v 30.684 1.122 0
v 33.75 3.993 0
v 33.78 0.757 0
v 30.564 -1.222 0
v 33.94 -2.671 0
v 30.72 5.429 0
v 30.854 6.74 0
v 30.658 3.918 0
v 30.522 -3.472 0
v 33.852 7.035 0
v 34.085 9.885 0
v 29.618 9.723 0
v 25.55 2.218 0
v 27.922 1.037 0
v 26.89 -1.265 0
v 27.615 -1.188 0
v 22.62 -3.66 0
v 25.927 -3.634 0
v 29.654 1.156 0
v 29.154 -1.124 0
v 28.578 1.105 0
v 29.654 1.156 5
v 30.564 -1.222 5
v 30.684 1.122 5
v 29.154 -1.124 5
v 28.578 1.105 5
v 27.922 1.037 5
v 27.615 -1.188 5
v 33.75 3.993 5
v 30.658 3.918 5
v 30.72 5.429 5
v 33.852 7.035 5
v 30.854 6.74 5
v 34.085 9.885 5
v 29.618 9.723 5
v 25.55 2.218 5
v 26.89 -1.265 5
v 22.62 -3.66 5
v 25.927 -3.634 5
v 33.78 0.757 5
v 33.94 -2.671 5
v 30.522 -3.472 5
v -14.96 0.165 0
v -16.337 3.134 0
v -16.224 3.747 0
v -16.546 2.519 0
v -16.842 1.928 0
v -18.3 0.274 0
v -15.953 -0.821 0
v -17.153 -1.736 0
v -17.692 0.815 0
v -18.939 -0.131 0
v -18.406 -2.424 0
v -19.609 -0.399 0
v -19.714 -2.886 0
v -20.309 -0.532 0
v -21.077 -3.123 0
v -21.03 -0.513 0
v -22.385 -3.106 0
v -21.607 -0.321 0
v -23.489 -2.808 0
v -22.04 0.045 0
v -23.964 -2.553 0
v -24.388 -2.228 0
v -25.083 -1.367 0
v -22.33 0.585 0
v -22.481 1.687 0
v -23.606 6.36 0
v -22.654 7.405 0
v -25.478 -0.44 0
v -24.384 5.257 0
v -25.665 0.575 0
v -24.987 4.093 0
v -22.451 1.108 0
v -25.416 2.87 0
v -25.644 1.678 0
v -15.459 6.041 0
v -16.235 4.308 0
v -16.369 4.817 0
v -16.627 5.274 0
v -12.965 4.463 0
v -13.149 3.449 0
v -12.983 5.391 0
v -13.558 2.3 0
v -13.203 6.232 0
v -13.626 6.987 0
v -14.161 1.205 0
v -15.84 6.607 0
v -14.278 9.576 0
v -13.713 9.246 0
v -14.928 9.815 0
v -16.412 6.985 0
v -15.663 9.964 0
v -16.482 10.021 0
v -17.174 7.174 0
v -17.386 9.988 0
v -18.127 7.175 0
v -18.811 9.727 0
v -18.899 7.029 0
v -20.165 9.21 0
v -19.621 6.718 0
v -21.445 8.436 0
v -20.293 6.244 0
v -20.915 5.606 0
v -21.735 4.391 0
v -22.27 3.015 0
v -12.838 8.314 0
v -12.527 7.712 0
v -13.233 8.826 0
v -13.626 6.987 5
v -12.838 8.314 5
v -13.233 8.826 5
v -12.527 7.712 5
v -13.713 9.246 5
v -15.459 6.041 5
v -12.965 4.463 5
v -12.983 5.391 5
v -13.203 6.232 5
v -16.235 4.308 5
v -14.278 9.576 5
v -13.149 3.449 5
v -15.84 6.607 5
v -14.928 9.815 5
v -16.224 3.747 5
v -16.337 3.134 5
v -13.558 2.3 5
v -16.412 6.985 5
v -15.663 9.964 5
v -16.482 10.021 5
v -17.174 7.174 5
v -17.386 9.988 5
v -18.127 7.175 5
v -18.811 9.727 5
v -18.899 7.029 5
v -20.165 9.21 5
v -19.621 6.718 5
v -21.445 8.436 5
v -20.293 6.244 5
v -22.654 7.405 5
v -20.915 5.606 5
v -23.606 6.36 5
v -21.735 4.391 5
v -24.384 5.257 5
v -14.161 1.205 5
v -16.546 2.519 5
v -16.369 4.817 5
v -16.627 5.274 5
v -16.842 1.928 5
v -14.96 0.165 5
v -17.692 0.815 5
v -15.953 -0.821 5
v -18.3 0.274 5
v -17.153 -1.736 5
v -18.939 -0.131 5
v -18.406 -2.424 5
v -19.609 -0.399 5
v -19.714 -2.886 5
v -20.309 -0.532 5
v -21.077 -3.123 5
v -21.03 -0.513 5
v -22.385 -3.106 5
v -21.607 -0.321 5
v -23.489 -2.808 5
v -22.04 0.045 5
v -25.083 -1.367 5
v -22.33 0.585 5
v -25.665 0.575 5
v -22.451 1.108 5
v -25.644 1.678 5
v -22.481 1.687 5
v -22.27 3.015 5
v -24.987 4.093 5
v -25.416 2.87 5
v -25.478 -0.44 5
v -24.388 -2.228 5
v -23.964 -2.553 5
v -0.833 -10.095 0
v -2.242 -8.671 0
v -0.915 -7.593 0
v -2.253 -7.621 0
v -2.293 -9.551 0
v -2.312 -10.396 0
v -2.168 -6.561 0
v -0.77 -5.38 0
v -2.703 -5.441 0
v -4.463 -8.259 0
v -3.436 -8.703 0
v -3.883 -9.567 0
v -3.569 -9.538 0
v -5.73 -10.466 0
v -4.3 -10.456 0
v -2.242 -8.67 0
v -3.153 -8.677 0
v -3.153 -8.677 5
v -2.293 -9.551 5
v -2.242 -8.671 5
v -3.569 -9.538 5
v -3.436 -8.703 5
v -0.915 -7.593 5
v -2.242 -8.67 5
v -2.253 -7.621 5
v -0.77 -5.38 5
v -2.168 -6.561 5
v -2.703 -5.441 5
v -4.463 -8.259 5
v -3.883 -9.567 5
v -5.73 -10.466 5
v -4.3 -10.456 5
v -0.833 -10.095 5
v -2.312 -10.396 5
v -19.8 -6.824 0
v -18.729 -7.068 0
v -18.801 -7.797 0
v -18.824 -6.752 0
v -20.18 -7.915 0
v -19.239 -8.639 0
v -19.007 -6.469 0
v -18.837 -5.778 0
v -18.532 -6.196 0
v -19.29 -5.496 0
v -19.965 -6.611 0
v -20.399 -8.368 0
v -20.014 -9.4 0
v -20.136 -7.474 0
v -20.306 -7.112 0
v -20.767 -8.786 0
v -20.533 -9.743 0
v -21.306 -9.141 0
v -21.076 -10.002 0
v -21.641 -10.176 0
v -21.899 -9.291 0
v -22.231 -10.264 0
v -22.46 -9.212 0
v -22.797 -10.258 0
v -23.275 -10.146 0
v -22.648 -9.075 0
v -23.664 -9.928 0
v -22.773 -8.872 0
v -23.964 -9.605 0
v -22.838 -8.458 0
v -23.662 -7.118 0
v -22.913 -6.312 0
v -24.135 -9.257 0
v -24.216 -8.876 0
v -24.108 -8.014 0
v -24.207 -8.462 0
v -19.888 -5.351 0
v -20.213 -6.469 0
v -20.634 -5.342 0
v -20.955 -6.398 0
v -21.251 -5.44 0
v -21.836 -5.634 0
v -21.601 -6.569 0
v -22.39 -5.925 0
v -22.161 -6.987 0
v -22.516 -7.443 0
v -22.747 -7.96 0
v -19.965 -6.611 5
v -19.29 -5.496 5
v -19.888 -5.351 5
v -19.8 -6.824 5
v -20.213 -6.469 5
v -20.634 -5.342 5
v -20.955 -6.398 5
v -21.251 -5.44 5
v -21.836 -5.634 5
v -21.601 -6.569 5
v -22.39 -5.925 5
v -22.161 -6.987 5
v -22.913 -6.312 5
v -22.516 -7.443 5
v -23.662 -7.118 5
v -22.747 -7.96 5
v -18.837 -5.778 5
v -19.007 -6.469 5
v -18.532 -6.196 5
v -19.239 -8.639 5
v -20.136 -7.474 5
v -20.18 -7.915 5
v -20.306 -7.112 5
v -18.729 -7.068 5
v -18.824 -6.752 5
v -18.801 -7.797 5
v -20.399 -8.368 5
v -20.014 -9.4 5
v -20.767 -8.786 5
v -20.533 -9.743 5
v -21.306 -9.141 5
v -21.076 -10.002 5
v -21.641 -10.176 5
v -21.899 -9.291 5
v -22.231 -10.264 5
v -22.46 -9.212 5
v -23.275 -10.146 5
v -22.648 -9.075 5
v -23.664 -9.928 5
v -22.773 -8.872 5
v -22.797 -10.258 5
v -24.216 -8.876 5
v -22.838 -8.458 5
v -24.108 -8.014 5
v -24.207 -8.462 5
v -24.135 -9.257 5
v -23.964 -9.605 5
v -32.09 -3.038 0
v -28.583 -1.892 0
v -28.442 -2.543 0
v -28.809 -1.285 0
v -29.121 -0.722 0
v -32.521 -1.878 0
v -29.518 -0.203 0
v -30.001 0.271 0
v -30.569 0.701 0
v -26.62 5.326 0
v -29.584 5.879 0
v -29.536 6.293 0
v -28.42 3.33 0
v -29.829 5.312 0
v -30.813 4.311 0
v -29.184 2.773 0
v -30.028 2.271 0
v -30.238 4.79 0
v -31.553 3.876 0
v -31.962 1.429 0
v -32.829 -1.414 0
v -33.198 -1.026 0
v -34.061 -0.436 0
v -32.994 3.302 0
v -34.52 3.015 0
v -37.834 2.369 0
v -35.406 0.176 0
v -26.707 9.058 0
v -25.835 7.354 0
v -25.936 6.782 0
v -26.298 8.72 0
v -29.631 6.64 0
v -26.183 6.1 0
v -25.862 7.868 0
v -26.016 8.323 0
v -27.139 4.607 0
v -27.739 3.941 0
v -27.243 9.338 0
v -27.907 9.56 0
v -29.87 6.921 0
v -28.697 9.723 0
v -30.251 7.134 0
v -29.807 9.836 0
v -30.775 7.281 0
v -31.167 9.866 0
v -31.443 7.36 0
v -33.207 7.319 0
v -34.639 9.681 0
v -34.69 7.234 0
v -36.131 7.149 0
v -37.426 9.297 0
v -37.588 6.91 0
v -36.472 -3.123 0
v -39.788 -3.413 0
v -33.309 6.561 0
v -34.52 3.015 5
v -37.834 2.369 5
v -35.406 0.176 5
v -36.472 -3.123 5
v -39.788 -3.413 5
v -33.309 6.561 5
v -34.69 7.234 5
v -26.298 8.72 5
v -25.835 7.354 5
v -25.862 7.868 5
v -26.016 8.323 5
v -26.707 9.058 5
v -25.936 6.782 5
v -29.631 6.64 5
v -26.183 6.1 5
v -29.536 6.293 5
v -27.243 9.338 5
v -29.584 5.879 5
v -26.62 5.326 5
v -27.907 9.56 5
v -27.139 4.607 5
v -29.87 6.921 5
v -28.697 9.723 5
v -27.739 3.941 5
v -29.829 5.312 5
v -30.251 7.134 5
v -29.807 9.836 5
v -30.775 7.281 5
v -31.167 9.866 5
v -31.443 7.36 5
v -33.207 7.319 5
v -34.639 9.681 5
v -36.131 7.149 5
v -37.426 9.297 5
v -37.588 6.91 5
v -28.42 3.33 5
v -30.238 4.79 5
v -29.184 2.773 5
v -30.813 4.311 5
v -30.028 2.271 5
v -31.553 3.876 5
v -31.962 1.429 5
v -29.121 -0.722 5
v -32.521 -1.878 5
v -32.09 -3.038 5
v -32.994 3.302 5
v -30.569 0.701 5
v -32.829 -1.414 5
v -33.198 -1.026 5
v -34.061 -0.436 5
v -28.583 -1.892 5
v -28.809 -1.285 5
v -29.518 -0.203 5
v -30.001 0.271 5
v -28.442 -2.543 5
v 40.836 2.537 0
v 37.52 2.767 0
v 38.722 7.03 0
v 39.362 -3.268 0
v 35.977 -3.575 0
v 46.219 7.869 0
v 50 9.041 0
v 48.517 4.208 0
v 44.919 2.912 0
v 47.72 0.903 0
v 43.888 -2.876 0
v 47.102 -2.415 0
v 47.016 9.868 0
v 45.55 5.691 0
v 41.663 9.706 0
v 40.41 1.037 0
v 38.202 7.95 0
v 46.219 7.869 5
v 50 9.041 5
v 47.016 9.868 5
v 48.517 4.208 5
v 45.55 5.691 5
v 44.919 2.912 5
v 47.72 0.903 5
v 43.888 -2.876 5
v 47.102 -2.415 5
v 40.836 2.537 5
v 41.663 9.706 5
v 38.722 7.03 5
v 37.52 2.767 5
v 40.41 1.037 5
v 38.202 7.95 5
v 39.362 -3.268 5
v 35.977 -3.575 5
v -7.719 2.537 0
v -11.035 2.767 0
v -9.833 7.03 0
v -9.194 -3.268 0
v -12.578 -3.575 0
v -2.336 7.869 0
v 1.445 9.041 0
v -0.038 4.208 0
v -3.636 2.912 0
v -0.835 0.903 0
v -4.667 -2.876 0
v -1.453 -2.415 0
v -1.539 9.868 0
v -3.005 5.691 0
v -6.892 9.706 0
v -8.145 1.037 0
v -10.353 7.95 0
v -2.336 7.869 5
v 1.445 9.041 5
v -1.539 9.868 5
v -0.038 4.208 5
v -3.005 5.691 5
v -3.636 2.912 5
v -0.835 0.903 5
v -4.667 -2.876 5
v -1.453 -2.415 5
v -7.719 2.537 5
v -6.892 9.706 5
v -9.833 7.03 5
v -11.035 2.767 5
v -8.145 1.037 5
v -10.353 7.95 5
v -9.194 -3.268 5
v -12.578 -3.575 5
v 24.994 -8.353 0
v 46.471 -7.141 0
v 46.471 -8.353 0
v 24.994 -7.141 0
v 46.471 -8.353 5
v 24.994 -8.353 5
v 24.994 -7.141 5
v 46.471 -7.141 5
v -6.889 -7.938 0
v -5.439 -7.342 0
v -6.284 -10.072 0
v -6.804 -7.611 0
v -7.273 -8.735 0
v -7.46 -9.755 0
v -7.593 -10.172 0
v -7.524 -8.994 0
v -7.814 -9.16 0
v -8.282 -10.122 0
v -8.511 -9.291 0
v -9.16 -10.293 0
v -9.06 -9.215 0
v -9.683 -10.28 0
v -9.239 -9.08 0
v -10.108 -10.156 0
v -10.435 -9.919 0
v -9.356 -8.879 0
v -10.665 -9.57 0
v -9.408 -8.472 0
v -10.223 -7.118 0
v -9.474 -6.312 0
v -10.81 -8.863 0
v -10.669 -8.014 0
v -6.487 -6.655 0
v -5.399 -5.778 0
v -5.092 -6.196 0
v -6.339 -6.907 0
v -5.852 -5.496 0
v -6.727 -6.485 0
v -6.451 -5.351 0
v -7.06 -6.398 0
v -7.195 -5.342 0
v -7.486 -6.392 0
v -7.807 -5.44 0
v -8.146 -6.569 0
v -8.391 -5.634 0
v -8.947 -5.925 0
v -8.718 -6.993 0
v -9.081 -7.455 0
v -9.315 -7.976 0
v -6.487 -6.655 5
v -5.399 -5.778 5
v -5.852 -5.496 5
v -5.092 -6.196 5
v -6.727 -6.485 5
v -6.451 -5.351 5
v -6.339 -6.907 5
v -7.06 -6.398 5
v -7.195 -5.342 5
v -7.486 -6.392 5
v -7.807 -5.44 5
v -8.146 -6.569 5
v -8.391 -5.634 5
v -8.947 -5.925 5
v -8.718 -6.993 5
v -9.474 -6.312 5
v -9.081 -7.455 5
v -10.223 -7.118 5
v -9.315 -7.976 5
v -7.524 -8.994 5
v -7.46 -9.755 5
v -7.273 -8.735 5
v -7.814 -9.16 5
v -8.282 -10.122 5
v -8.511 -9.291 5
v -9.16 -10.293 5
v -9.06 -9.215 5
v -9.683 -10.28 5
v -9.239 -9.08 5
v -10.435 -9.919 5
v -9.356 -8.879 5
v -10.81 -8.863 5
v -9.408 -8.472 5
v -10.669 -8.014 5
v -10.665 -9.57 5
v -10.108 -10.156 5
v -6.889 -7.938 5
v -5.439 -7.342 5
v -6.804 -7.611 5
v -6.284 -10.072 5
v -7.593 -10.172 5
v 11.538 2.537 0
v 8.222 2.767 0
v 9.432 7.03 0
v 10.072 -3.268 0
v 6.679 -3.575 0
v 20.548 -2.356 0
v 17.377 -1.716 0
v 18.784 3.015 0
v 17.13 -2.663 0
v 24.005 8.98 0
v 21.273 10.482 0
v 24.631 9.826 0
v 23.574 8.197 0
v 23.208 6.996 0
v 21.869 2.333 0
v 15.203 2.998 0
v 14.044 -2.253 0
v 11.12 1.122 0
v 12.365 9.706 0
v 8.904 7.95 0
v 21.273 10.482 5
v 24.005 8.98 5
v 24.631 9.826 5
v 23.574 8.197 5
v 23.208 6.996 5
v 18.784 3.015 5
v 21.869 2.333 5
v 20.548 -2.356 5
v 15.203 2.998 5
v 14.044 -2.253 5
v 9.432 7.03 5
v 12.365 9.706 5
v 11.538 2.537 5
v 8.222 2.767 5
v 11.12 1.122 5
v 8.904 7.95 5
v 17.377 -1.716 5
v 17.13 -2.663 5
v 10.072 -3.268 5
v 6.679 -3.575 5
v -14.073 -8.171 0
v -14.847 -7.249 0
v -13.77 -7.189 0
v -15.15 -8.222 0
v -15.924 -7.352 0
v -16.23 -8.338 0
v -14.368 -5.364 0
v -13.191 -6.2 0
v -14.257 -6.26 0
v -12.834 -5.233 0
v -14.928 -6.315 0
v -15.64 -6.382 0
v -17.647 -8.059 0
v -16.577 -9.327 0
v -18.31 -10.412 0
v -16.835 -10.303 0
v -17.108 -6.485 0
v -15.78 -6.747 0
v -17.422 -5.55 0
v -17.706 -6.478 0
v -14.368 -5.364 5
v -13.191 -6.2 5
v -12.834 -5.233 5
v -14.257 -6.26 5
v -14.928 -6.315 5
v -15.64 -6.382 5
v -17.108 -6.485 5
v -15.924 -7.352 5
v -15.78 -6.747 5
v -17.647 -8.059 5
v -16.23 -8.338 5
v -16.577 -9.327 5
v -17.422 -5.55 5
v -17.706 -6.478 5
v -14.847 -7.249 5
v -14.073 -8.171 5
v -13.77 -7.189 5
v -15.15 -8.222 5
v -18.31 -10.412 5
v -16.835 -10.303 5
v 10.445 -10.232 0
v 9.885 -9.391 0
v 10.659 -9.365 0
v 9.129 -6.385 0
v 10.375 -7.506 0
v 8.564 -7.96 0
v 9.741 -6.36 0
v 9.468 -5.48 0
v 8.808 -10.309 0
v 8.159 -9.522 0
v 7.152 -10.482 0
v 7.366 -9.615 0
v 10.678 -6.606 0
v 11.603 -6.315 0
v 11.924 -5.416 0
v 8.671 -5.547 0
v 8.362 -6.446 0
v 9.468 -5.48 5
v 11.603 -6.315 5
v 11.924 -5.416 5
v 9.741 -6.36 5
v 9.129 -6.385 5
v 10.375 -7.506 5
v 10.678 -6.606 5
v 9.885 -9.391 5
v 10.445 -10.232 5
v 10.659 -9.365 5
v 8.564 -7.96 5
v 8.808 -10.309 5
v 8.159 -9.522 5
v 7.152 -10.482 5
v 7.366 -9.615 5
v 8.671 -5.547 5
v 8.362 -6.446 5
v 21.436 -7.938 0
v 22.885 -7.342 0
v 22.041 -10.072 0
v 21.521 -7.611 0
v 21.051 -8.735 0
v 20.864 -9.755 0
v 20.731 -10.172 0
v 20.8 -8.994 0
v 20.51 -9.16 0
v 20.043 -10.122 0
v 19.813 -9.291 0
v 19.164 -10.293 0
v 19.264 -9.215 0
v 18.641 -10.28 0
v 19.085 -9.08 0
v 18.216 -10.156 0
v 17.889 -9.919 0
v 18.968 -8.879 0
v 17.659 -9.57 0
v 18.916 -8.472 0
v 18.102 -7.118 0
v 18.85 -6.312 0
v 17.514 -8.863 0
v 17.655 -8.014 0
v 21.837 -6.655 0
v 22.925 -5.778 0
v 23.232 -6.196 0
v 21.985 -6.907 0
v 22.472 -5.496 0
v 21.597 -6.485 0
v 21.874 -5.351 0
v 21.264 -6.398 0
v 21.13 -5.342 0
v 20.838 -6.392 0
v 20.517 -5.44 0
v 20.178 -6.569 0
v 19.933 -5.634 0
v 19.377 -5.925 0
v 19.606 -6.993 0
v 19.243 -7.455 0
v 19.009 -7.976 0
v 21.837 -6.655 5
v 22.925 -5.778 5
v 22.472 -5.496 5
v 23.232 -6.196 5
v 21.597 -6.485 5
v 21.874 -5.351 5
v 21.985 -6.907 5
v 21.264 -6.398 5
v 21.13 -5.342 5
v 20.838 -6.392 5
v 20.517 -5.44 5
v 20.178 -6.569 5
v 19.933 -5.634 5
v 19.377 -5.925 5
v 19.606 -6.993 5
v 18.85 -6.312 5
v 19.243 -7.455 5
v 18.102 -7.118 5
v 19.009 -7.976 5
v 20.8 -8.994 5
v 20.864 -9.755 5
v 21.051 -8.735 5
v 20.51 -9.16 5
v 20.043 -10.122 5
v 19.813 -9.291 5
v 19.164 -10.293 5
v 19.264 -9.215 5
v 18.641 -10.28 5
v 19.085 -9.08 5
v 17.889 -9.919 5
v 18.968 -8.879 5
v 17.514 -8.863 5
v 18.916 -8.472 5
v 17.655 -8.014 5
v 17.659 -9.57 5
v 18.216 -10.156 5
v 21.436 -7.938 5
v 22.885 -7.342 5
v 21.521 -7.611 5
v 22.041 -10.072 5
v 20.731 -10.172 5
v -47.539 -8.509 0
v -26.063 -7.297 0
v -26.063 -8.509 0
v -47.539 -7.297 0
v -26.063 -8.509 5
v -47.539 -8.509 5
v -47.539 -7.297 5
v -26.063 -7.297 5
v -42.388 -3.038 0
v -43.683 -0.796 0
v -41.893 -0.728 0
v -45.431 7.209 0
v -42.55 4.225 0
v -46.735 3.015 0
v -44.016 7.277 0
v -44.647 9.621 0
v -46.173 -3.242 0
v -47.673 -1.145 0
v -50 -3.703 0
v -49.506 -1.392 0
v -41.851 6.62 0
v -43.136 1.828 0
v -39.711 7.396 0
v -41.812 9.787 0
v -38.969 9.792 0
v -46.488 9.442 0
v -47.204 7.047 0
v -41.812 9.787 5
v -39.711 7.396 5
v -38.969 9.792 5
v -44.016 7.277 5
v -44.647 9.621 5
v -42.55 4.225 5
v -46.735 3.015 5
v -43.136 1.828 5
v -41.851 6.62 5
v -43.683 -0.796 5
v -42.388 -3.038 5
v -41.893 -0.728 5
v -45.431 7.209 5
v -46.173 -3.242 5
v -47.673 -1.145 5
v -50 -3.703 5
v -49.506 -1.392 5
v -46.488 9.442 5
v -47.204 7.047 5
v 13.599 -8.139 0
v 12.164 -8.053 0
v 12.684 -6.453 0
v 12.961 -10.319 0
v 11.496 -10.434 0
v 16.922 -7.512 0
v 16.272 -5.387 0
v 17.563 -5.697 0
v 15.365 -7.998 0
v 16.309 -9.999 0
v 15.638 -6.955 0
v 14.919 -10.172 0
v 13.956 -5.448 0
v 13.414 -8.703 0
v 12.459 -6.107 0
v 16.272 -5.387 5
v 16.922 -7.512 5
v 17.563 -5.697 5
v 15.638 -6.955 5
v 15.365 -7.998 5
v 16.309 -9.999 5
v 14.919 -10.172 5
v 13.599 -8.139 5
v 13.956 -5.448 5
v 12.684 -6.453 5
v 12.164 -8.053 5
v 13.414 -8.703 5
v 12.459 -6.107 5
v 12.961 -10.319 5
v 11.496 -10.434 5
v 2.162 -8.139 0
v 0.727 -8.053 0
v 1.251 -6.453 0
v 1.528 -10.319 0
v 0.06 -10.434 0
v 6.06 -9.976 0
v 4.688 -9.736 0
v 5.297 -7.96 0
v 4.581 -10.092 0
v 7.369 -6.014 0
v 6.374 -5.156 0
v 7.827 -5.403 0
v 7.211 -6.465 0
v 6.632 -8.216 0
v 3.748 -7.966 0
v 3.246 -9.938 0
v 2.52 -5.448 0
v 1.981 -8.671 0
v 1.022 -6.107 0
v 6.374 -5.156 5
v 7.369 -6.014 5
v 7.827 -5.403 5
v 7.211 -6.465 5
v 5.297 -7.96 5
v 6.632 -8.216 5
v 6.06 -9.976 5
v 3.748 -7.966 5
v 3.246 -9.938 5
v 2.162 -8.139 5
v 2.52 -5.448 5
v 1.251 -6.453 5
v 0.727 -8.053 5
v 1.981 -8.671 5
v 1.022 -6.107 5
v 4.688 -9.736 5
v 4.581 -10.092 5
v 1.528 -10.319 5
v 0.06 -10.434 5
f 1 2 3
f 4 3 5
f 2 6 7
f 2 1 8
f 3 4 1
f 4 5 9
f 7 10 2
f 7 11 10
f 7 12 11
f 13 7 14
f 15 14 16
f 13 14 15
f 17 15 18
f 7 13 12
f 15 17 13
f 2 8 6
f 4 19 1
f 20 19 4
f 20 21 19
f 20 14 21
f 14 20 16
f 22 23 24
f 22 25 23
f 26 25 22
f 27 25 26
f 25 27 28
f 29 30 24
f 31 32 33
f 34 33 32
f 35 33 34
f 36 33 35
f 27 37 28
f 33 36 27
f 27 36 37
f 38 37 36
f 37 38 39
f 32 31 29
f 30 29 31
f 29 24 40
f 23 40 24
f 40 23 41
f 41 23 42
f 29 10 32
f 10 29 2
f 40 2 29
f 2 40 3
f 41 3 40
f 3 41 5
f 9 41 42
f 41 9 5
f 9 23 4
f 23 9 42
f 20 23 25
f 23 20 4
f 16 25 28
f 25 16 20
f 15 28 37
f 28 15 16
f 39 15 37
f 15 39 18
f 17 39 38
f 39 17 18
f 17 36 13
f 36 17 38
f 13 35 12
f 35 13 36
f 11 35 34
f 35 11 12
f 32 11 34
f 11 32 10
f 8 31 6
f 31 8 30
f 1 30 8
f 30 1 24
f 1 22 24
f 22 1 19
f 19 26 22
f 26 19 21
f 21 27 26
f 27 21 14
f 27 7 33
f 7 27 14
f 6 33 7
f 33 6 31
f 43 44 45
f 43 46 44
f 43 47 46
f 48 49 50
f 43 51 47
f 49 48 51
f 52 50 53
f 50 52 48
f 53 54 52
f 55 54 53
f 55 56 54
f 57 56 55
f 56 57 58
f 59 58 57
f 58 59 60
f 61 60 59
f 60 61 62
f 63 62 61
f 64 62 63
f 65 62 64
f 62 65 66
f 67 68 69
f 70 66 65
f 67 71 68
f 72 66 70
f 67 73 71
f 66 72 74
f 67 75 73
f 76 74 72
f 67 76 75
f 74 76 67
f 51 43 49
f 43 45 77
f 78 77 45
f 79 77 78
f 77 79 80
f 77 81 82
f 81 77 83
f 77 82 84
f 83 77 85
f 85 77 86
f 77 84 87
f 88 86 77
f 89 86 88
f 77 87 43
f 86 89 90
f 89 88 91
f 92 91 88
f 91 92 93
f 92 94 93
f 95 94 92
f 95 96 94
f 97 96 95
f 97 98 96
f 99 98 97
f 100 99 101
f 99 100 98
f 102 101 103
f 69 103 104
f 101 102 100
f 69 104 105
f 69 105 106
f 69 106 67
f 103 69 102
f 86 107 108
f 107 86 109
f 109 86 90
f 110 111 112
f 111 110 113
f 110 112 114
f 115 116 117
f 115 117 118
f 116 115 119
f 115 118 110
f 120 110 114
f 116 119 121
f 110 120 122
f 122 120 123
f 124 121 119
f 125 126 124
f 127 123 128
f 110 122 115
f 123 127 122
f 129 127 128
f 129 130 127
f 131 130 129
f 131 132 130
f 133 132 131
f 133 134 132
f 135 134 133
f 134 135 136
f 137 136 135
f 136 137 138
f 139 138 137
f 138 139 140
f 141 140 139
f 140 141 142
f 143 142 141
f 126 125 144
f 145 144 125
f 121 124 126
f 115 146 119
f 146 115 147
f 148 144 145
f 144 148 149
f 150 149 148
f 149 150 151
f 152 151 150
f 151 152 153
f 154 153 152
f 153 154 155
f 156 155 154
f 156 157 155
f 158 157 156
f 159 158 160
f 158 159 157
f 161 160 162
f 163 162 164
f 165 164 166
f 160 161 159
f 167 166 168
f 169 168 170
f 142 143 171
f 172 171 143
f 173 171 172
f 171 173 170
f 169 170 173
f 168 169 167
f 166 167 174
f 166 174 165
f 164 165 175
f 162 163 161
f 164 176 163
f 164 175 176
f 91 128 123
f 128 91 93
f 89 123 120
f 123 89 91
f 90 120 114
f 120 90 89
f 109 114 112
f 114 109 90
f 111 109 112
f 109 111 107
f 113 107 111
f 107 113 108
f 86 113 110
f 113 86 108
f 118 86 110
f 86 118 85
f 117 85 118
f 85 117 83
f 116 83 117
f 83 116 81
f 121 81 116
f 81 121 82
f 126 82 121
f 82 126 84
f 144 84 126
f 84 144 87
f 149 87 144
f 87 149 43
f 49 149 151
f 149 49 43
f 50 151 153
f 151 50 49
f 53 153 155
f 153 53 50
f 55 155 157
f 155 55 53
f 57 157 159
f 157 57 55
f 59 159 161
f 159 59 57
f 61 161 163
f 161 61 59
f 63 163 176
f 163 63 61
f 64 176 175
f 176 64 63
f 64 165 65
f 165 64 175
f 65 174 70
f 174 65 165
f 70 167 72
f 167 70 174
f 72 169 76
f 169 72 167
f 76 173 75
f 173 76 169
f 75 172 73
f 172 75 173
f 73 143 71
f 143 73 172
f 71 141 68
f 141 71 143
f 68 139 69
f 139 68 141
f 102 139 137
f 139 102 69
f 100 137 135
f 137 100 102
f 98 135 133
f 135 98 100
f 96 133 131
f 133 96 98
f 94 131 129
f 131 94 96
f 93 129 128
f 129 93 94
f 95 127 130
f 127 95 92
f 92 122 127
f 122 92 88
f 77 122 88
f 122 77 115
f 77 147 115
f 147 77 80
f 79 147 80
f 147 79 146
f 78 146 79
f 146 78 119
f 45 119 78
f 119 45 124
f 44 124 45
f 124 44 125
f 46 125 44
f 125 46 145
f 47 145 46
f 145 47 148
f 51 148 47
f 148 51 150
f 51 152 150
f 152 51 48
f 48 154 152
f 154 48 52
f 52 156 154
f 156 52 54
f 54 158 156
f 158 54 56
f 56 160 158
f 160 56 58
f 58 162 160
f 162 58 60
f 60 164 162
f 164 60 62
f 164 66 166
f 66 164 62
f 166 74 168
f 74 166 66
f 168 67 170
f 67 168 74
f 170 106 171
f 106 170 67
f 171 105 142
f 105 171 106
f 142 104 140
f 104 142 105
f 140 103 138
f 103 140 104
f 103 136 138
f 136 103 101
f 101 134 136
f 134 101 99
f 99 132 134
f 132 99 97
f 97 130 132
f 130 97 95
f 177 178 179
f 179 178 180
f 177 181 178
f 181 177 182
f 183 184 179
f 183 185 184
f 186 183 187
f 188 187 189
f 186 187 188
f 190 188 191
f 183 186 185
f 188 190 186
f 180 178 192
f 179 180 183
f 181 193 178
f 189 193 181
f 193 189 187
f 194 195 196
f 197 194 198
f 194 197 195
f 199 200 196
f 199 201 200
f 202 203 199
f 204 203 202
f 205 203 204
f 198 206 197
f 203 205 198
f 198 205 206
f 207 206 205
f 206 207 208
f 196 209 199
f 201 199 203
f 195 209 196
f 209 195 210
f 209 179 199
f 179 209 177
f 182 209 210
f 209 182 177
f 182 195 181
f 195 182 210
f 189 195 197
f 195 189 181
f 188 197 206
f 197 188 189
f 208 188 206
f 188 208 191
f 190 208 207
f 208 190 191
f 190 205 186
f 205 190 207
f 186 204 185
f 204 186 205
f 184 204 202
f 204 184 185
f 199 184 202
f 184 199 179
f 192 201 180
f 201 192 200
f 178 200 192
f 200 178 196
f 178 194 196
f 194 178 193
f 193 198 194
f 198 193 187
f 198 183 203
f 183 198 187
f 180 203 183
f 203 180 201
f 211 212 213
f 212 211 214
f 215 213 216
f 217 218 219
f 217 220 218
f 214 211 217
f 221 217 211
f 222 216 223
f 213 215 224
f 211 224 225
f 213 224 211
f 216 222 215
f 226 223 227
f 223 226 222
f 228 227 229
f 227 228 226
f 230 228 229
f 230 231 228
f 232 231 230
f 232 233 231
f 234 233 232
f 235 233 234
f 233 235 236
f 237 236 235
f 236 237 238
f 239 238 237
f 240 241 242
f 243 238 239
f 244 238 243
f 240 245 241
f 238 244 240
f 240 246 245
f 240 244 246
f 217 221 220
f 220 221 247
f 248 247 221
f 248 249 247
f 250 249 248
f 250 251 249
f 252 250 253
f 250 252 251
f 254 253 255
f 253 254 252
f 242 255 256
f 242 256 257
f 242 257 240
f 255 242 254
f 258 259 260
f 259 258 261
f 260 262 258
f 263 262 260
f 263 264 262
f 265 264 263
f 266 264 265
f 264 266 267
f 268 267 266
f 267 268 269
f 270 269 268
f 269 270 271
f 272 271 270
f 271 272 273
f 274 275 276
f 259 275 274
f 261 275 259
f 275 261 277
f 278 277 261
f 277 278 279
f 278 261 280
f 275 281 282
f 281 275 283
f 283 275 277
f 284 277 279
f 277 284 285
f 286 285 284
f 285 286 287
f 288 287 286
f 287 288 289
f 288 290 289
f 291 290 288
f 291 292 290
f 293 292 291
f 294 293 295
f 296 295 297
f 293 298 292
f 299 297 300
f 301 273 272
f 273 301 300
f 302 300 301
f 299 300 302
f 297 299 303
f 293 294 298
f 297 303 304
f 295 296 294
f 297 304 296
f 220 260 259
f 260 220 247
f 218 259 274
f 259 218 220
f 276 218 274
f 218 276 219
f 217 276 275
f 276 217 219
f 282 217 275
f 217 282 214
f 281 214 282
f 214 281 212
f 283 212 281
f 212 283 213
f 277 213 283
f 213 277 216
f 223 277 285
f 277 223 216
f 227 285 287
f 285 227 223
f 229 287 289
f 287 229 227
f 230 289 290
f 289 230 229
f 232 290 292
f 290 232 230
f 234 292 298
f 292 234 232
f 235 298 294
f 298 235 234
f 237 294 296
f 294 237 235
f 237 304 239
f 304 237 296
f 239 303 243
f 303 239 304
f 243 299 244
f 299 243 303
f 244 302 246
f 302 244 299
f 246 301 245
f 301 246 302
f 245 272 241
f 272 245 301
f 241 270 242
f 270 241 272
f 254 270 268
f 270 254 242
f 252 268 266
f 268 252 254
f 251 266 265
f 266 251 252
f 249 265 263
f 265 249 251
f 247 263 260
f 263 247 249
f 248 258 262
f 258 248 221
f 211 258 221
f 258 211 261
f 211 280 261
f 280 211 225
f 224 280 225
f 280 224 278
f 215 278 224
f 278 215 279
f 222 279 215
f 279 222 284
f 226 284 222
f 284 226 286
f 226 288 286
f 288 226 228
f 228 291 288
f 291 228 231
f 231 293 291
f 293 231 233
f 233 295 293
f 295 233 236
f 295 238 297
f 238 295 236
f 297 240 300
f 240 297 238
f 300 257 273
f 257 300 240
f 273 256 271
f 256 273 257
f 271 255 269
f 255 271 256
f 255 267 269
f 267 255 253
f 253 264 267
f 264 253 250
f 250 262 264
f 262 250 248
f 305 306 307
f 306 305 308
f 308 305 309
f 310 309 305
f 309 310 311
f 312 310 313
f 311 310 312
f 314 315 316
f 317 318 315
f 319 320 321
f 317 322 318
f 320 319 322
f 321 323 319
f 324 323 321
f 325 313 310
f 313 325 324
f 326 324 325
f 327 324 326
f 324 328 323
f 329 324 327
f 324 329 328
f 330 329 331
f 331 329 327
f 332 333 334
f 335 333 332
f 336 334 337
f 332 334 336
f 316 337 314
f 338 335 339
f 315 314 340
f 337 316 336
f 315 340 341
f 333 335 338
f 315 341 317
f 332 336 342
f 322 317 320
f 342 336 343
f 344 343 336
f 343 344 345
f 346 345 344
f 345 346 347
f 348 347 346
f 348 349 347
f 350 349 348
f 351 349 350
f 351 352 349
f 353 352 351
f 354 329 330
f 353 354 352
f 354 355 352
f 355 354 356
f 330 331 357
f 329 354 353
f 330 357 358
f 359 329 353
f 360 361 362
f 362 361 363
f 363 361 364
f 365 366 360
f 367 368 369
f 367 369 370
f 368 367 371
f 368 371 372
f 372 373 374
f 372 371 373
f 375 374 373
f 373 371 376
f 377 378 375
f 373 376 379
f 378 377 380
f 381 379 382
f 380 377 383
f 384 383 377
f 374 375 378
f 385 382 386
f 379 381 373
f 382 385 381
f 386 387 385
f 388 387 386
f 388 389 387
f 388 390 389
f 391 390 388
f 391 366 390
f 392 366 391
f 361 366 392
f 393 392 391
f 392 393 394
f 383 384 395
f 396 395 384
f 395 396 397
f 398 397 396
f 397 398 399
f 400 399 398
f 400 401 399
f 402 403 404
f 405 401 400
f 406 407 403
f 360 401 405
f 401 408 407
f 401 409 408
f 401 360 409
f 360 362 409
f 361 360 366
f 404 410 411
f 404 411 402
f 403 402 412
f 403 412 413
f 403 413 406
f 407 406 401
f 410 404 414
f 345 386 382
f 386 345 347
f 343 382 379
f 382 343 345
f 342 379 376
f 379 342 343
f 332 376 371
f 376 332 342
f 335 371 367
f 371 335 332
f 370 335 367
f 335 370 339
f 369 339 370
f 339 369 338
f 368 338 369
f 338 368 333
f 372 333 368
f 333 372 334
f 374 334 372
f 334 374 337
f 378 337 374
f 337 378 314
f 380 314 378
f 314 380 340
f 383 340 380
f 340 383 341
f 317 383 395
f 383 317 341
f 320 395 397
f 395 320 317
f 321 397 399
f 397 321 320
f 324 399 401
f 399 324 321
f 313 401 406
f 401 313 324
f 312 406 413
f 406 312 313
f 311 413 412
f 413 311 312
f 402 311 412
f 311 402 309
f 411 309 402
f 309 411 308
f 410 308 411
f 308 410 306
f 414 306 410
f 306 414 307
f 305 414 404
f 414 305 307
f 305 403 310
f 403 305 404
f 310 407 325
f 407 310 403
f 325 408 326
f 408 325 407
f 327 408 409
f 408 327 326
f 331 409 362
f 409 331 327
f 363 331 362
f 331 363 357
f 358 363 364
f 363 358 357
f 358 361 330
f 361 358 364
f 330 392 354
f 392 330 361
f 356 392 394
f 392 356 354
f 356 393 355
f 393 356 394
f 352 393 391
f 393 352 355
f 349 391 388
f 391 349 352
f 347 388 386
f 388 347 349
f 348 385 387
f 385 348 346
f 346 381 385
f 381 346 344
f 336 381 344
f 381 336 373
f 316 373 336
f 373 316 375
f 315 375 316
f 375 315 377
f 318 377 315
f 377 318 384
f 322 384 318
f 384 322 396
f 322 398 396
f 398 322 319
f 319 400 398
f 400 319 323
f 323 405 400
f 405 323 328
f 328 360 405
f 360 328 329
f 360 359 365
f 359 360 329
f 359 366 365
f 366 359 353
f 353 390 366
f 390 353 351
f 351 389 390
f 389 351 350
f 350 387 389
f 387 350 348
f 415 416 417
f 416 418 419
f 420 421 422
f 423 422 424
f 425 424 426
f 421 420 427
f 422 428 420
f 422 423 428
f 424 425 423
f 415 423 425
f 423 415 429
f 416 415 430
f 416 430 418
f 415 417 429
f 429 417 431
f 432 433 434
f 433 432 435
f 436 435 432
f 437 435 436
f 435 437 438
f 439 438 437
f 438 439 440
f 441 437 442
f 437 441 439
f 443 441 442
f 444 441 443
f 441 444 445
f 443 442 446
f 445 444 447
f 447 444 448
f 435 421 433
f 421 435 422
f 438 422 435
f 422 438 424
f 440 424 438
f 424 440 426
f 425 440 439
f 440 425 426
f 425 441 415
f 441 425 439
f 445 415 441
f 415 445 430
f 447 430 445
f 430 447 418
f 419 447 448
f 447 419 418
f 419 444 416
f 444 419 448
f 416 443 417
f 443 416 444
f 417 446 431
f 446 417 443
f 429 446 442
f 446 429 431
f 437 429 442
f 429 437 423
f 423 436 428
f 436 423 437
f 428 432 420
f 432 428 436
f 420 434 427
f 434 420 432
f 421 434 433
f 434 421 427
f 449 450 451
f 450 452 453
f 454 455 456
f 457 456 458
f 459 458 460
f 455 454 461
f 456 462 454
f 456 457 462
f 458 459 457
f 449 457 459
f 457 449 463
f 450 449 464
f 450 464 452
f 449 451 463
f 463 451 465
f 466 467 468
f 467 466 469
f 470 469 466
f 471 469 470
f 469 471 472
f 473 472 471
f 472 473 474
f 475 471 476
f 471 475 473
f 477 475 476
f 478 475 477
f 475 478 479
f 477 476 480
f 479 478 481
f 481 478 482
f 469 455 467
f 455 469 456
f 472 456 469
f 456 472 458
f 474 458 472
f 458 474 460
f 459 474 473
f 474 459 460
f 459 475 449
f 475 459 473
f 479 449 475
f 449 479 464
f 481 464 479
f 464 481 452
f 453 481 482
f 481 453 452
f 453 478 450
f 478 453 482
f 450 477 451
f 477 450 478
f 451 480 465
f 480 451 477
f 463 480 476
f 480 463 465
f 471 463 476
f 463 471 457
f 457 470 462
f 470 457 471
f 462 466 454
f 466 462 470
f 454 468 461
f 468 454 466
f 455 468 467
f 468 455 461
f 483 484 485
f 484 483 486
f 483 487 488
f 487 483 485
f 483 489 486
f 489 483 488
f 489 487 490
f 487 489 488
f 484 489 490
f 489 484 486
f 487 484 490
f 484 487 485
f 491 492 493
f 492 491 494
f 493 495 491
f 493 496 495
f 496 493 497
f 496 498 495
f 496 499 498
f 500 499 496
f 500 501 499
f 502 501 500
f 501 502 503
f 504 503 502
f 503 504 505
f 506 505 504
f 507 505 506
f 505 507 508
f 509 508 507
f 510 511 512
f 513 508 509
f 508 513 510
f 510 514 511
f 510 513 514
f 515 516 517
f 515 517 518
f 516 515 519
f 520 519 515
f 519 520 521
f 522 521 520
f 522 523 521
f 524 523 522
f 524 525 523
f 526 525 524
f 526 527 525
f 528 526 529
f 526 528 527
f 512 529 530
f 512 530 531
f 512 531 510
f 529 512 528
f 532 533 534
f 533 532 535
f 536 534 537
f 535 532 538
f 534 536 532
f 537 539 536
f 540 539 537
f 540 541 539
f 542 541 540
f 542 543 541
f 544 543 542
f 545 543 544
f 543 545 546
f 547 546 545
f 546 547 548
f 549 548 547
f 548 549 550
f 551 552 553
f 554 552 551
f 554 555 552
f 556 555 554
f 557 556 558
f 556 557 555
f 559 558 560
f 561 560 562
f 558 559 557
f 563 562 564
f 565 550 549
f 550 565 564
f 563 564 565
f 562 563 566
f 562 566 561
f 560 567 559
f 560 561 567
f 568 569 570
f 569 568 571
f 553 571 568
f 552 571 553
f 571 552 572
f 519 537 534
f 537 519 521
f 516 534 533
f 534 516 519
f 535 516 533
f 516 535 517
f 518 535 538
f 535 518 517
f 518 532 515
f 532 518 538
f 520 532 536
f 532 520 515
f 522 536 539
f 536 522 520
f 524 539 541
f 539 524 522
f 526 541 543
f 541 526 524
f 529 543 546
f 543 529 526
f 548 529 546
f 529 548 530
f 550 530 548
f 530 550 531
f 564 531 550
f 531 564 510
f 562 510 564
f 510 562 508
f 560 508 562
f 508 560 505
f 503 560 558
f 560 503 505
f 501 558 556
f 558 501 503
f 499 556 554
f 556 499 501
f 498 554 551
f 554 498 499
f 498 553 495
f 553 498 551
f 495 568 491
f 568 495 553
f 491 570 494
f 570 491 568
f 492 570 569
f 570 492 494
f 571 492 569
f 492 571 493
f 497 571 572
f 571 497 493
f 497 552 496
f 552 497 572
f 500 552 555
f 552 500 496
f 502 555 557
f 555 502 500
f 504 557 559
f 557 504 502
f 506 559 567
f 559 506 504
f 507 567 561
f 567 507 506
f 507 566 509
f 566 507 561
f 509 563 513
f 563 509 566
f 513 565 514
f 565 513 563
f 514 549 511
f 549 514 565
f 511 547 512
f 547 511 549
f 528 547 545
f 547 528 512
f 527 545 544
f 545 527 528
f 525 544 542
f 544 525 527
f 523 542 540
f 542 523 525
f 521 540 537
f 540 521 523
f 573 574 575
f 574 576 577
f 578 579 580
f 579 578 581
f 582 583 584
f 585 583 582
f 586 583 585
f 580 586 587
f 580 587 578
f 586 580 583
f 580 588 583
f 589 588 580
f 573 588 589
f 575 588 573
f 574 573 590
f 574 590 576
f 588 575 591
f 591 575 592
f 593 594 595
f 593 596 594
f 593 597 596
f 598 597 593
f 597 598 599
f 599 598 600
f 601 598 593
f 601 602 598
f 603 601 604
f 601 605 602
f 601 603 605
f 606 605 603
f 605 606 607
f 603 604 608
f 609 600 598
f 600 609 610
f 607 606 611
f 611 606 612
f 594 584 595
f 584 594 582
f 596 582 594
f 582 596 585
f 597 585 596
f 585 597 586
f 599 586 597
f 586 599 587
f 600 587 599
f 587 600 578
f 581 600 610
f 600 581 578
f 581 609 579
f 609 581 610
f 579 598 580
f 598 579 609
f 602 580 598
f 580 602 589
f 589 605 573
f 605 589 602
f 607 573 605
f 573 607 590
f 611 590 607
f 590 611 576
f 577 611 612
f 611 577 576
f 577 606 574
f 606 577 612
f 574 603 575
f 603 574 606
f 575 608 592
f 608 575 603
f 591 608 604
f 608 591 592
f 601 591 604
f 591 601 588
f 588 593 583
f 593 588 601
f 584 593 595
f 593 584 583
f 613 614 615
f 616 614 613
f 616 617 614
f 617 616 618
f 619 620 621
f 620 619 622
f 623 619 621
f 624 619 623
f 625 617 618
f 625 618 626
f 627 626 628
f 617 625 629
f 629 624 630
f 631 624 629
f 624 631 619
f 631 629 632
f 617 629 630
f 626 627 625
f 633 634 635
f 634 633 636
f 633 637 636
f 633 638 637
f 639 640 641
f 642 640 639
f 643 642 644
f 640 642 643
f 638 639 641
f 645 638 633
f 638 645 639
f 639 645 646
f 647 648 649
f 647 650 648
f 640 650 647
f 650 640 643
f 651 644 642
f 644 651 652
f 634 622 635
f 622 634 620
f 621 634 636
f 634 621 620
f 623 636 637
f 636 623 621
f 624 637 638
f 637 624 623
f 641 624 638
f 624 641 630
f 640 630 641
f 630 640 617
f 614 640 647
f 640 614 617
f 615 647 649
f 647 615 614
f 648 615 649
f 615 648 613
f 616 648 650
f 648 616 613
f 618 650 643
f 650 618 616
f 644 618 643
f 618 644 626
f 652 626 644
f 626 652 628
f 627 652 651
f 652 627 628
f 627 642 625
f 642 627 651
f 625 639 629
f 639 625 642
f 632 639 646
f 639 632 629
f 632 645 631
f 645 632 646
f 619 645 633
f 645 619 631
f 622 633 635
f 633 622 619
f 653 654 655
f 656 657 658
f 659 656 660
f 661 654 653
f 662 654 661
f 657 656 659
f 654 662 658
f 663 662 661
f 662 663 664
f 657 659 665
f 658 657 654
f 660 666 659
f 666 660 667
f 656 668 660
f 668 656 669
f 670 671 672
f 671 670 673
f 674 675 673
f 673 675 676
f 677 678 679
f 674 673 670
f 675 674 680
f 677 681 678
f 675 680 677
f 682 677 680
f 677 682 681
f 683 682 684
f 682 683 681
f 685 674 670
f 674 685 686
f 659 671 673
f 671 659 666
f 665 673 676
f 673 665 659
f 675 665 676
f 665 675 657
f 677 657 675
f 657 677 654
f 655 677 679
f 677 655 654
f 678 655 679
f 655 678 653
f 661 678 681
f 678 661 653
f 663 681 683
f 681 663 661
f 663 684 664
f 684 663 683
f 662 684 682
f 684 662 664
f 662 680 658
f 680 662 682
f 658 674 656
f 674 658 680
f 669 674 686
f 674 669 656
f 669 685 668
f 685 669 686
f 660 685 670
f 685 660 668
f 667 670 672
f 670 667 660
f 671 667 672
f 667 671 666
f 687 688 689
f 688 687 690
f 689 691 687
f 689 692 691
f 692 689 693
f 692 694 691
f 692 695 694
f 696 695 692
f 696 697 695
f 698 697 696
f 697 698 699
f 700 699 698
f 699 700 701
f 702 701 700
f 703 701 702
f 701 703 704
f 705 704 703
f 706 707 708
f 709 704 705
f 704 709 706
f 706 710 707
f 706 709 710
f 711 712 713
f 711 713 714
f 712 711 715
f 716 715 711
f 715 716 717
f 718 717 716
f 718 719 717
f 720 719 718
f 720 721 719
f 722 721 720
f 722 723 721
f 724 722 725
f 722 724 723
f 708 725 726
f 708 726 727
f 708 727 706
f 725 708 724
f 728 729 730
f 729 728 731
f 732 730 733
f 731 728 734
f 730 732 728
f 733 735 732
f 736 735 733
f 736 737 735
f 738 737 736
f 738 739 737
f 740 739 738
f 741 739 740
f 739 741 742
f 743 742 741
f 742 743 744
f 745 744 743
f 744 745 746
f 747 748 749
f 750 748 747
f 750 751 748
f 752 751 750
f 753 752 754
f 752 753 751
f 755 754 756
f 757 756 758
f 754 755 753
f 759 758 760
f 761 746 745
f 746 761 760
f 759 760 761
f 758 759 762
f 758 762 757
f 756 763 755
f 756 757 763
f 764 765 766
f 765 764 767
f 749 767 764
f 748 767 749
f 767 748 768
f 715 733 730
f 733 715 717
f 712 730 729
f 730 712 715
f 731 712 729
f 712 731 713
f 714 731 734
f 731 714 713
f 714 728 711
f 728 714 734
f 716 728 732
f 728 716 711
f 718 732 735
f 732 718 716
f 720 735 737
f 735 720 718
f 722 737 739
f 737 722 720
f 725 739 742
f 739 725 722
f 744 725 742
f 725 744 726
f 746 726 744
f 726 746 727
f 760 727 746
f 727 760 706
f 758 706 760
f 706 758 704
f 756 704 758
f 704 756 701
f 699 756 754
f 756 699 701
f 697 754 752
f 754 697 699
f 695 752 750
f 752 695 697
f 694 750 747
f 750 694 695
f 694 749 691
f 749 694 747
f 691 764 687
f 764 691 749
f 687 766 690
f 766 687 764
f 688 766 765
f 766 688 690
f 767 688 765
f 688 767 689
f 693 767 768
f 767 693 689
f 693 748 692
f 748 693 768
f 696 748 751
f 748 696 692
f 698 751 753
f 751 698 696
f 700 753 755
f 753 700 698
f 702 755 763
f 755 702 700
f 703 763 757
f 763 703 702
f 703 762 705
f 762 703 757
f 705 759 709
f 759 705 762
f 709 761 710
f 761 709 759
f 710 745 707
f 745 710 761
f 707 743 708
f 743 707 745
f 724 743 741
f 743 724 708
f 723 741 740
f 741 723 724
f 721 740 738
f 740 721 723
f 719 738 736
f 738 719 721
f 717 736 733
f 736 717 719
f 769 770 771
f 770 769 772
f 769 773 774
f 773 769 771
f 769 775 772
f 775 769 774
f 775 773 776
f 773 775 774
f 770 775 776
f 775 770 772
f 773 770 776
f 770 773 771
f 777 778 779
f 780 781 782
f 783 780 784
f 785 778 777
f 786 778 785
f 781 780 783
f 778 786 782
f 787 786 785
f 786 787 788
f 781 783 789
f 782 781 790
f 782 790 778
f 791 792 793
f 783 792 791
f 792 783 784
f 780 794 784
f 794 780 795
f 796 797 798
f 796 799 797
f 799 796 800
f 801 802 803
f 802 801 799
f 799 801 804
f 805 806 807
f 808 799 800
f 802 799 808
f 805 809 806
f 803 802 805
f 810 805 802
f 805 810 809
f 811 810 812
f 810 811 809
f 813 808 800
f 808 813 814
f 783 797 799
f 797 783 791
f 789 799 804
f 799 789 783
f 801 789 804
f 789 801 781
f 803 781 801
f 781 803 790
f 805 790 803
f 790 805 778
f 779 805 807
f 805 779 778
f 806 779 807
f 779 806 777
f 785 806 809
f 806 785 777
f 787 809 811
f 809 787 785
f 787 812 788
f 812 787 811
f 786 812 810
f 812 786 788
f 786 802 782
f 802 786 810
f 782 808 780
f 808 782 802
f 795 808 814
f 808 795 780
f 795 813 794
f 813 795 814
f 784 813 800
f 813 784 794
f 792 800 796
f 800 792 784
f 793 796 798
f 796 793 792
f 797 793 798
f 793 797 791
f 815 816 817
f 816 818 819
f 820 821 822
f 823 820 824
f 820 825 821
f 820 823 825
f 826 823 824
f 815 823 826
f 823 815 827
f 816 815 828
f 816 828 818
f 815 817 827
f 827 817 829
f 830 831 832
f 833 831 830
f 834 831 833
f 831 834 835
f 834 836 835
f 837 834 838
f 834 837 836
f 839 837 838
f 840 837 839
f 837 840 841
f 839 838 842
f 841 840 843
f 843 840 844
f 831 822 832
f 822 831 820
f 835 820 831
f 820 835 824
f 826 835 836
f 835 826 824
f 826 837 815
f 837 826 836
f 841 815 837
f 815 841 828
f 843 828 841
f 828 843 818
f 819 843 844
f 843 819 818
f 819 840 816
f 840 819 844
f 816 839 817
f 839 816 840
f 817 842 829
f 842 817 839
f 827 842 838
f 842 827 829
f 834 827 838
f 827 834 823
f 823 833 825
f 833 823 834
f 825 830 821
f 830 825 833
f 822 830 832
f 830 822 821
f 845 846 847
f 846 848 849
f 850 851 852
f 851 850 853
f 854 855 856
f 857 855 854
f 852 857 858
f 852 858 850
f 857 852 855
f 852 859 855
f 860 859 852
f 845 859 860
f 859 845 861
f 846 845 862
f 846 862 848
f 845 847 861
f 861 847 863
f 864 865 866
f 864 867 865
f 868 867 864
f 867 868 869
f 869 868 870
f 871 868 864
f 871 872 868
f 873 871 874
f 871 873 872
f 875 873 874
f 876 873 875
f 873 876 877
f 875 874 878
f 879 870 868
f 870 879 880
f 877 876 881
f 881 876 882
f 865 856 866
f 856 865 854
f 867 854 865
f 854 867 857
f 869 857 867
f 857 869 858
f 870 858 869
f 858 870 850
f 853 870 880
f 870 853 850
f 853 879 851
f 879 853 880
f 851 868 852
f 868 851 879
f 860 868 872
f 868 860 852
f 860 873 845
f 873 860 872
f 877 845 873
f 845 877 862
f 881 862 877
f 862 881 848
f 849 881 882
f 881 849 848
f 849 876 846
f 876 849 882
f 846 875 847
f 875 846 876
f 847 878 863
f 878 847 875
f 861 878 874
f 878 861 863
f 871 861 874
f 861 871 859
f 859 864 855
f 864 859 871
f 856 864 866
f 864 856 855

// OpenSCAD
// Module names are of the form poly_<inkscape-path-id>().  As a result,
// you can associate a polygon in this OpenSCAD program with the corresponding
// SVG element in the Inkscape document by looking for the XML element with
// the attribute id="inkscape-path-id".

// fudge value is used to ensure that subtracted solids are a tad taller
// in the z dimension than the polygon being subtracted from.  This helps
// keep the resulting .stl file manifold.
fudge = 0.1;

module poly_path3118(h)
{
  scale([25.4/90, -25.4/90, 1]) union()
  {
    linear_extrude(height=h)
      polygon([[166.895765,8.558577],[155.508615,10.189637],[144.695355,-8.990313],[143.185125,-3.674303],[139.469945,11.579047],[127.478705,12.666417],[132.945745,-9.805843],[137.204605,-24.908163],[135.362115,-28.170273],[147.625205,-34.392423],[159.163375,-10.319323],[161.398525,-20.166033],[163.769558,-27.883296],[166.593725,-34.966313],[177.165345,-32.036463],[171.909735,-14.910433],[169.085571,-3.198567],[166.895765,8.558577]]);
  }
}

module poly_path3116(h)
{
  scale([25.4/90, -25.4/90, 1]) union()
  {
    difference()
    {
       linear_extrude(height=h)
         polygon([[120.259795,9.464717],[108.147735,12.303957],[108.298755,4.329927],[103.299869,3.982579],[97.847945,4.209117],[95.280555,4.480957],[91.867425,12.877847],[80.148025,12.968447],[90.530861,-7.857642],[104.946035,-34.452843],[120.773275,-35.026733],[119.948288,-24.928926],[119.587713,-14.147753],[119.691548,-2.683211],[120.259795,9.464707]]);
       translate([0, 0, -fudge])
         linear_extrude(height=h+2*fudge)
           polygon([[108.721625,-3.976353],[108.631025,-13.883483],[108.849995,-19.237235],[109.325735,-23.881223],[98.935335,-3.674313],[101.261095,-3.915943],[105.074410,-4.097163],[108.721645,-3.976343]]);
    }
  }
}

module poly_path3112(h)
{
  scale([25.4/90, -25.4/90, 1]) union()
  {
    linear_extrude(height=h)
      polygon([[-5.149885,8.558577],[-16.537035,10.189637],[-27.350305,-8.990313],[-28.860535,-3.674303],[-32.575705,11.579047],[-44.566945,12.666417],[-39.099905,-9.805843],[-34.841055,-24.908163],[-36.683535,-28.170273],[-24.420455,-34.392423],[-12.882275,-10.319323],[-10.647135,-20.166033],[-8.276099,-27.883296],[-5.451935,-34.966313],[5.119695,-32.036463],[-0.135915,-14.910433],[-2.960086,-3.198567],[-5.149885,8.558577]]);
  }
}

module poly_path3110(h)
{
  scale([25.4/90, -25.4/90, 1]) union()
  {
    difference()
    {
       linear_extrude(height=h)
         polygon([[-46.590665,-12.222213],[-48.038628,-8.150242],[-50.177504,-4.270831],[-53.007292,-0.583979],[-56.527995,2.910317],[-60.777428,6.149764],[-65.219402,8.588787],[-69.853921,10.227387],[-74.680985,11.065567],[-79.317409,11.005154],[-83.228911,9.947990],[-84.912818,9.045627],[-86.415496,7.894075],[-88.877165,4.843407],[-90.276022,1.560546],[-90.938639,-2.035692],[-90.865016,-5.945308],[-90.055155,-10.168303],[-88.537374,-14.502653],[-86.400396,-18.625581],[-83.644220,-22.537088],[-80.268845,-26.237173],[-75.987348,-29.890024],[-71.449105,-32.632975],[-66.654115,-34.466027],[-61.602375,-35.389183],[-58.399754,-35.507627],[-55.497287,-35.304206],[-52.894974,-34.778922],[-50.592816,-33.931773],[-48.590812,-32.762760],[-46.888963,-31.271883],[-45.487267,-29.459141],[-44.385725,-27.324533],[-48.282125,-24.757143],[-46.783248,-22.082130],[-46.001712,-19.101303],[-45.937518,-15.814665],[-46.590665,-12.222213]]);
       translate([0, 0, -fudge])
         linear_extrude(height=h+2*fudge)
           polygon([[-54.776125,-21.404423],[-56.125917,-23.411129],[-58.151522,-24.749567],[-60.852942,-25.419738],[-64.230175,-25.421643],[-66.965599,-24.904370],[-69.523561,-23.805671],[-71.904060,-22.125545],[-74.107095,-19.863993],[-77.014307,-15.559811],[-78.909635,-10.681773],[-79.657211,-5.977391],[-79.549604,-3.925366],[-79.121065,-2.073453],[-78.096006,-0.161118],[-76.561237,1.135795],[-74.516758,1.817287],[-71.962565,1.883357],[-69.480138,1.415188],[-67.107192,0.463742],[-64.843728,-0.970982],[-62.689745,-2.888983],[-59.676857,-6.830677],[-58.629128,-8.926126],[-57.887205,-11.104643],[-57.487012,-13.277476],[-57.524775,-15.265315],[-58.000492,-17.068160],[-58.914165,-18.686013],[-54.776125,-21.404423]]);
    }
  }
}

module poly_rect30160(h)
{
  scale([25.4/90, -25.4/90, 1]) union()
  {
    linear_extrude(height=h)
      polygon([[88.563145,25.302507],[164.659672,25.302507],[164.659672,29.598279],[88.563145,29.598279]]);
  }
}

module poly_path3125(h)
{
  scale([25.4/90, -25.4/90, 1]) union()
  {
    linear_extrude(height=h)
      polygon([[-22.265003,35.689455],[-26.904104,36.041010],[-26.433661,34.566738],[-29.344543,35.865229],[-32.457963,36.471954],[-34.310339,36.426589],[-35.816413,35.984305],[-36.976186,35.145104],[-37.789659,33.908985],[-38.302579,31.402718],[-37.802755,28.397463],[-36.221547,25.222111],[-33.568767,22.364281],[-31.701694,20.992788],[-29.733344,19.962924],[-27.663716,19.274690],[-25.492807,18.928088],[-22.856372,18.959991],[-20.736111,19.475282],[-19.132024,20.473959],[-18.044111,21.956021],[-22.461060,24.473622],[-22.984600,23.581268],[-23.836466,22.979514],[-25.016657,22.668356],[-26.525173,22.647794],[-28.864333,23.277204],[-30.889844,24.779819],[-32.177039,26.415707],[-33.006844,28.261379],[-33.336814,30.019172],[-33.150590,31.459416],[-32.738139,32.171750],[-32.101898,32.653017],[-30.158046,32.922352],[-27.688212,32.457387],[-26.659942,31.867679],[-25.770512,30.949095],[-24.408174,28.125286],[-24.107616,26.968548],[-19.272491,26.015945],[-22.265035,35.689455]]);
  }
}

module poly_path3127(h)
{
  scale([25.4/90, -25.4/90, 1]) union()
  {
    difference()
    {
       linear_extrude(height=h)
         polygon([[-2.950663,35.768834],[-8.190890,36.834846],[-8.125516,33.840934],[-12.647009,33.795567],[-13.757781,33.897629],[-15.234452,37.050309],[-20.304793,37.084311],[-15.812709,29.264995],[-9.576059,19.279615],[-2.728479,19.064143],[-3.241405,26.903321],[-2.950631,35.768806]]);
       translate([0, 0, -fudge])
         linear_extrude(height=h+2*fudge)
           polygon([[-7.942567,30.722257],[-7.981748,27.002541],[-7.681190,23.248814],[-12.176544,30.835657],[-11.170317,30.744922],[-7.942545,30.722285]]);
    }
  }
}

module poly_path3114(h)
{
  scale([25.4/90, -25.4/90, 1]) union()
  {
    linear_extrude(height=h)
      polygon([[87.276325,-34.815293],[85.056236,-31.817450],[83.530955,-29.046203],[82.232155,-24.787343],[77.490025,-8.265403],[72.808305,8.347147],[60.696235,9.434517],[61.572175,6.081797],[66.555935,-10.681773],[49.762155,7.984697],[40.881995,-8.990313],[39.401965,-3.976343],[35.686795,11.579047],[23.665345,12.666417],[29.132385,-9.805843],[33.421445,-24.908163],[31.548755,-28.170273],[43.811845,-34.392423],[53.869985,-10.621373],[75.375695,-37.141043],[87.276325,-34.815293]]);
  }
}

module poly_path3123(h)
{
  scale([25.4/90, -25.4/90, 1]) union()
  {
    linear_extrude(height=h)
      polygon([[-45.473571,18.542502],[-46.741153,21.967358],[-50.517773,22.182830],[-52.896139,22.375618],[-55.418240,22.613773],[-55.914811,23.906595],[-56.424467,26.049966],[-52.608645,25.687064],[-48.792812,25.471592],[-49.864381,28.953153],[-53.680203,29.134603],[-57.509101,29.542863],[-58.737480,33.047098],[-59.652228,36.505974],[-64.879391,36.891551],[-62.527164,28.556230],[-60.619253,22.976666],[-62.736253,22.954029],[-61.730025,19.665256],[-50.909811,19.007504],[-45.473571,18.542539]]);
  }
}

module poly_path3131(h)
{
  scale([25.4/90, -25.4/90, 1]) union()
  {
    linear_extrude(height=h)
      polygon([[37.010940,36.256482],[31.208790,36.528658],[25.341310,37.141043],[26.099246,34.067752],[28.908841,33.738871],[30.346309,28.204675],[32.345701,22.625110],[29.627575,22.840582],[30.725283,19.653882],[33.547942,19.415727],[42.251156,19.188918],[41.114257,22.375618],[34.514967,22.534385],[37.834208,23.407609],[36.762649,26.594309],[35.024613,33.273907],[37.768877,33.183172],[37.010940,36.256472]]);
  }
}

module poly_path3121(h)
{
  scale([25.4/90, -25.4/90, 1]) union()
  {
    difference()
    {
       linear_extrude(height=h)
         polygon([[-66.617417,27.626301],[-68.169243,30.611712],[-70.916746,33.307928],[-72.755245,34.524206],[-74.677044,35.439959],[-76.682147,36.055184],[-78.770554,36.369882],[-80.776478,36.347203],[-82.468769,35.950285],[-83.847428,35.179127],[-84.912454,34.033731],[-85.517665,32.801154],[-85.804345,31.450918],[-85.772493,29.983022],[-85.422111,28.397463],[-83.840897,25.222111],[-81.188112,22.364281],[-79.335746,20.992788],[-77.372297,19.962924],[-75.297766,19.274690],[-73.112151,18.928088],[-70.470820,18.959991],[-68.348926,19.475282],[-66.746472,20.473959],[-65.663456,21.956021],[-67.349215,22.919970],[-66.700736,23.924325],[-66.362608,25.043498],[-66.617417,27.626301]]);
       translate([0, 0, -fudge])
         linear_extrude(height=h+2*fudge)
           polygon([[-70.158810,24.178771],[-70.742795,23.425338],[-71.619164,22.922811],[-74.249062,22.670478],[-76.539218,23.277207],[-78.522263,24.757135],[-79.780055,26.373176],[-80.600060,28.204675],[-80.923491,29.970971],[-80.691519,31.436733],[-80.248035,32.154735],[-79.584025,32.641671],[-77.594430,32.922352],[-75.493781,32.389348],[-73.582594,31.130545],[-72.279082,29.650600],[-71.504798,28.045907],[-71.347996,26.483749],[-71.949102,25.199425],[-70.158799,24.178771]]);
    }
  }
}

module poly_path3108(h)
{
  scale([25.4/90, -25.4/90, 1]) union()
  {
    difference()
    {
       linear_extrude(height=h)
         polygon([[-100.777795,9.011647],[-113.705385,10.763517],[-115.230741,6.655693],[-116.321878,5.009540],[-117.631985,3.635227],[-120.690226,1.543559],[-125.454995,-0.623633],[-129.230575,11.065567],[-140.980175,12.092527],[-134.055772,-8.393765],[-128.022385,-25.331033],[-133.187385,-24.485303],[-132.613495,-32.942603],[-122.736575,-34.301813],[-110.435755,-34.958731],[-105.616221,-34.851134],[-101.683935,-34.452833],[-98.881526,-33.873739],[-96.530295,-33.087936],[-94.630241,-32.095425],[-93.181364,-30.896205],[-92.183664,-29.490275],[-91.637141,-27.877637],[-91.541795,-26.058290],[-91.897625,-24.032233],[-92.773565,-21.615863],[-94.322511,-18.872897],[-96.160286,-16.322487],[-98.286888,-13.964634],[-100.702317,-11.799337],[-103.406575,-9.826597],[-106.399661,-8.046413],[-113.252315,-5.063713],[-108.315766,-2.484984],[-106.301972,-0.960593],[-104.591164,0.720484],[-103.183342,2.558246],[-102.078507,4.552694],[-101.276658,6.703827],[-100.777795,9.011647]]);
       translate([0, 0, -fudge])
         linear_extrude(height=h+2*fudge)
           polygon([[-104.825215,-20.830543],[-104.655799,-22.297815],[-104.993251,-23.528173],[-105.837571,-24.521617],[-107.188759,-25.278147],[-109.046815,-25.797763],[-111.411740,-26.080464],[-117.662195,-25.935123],[-122.917805,-25.633073],[-118.024645,-23.246913],[-122.313705,-10.681773],[-116.907099,-11.701166],[-111.802495,-13.732443],[-109.180373,-15.274755],[-107.143454,-16.971875],[-105.691735,-18.823804]]);
    }
  }
}

module poly_path3135(h)
{
  scale([25.4/90, -25.4/90, 1]) union()
  {
    linear_extrude(height=h)
      polygon([[78.096369,35.689455],[73.457268,36.041010],[73.927711,34.566738],[71.016830,35.865229],[67.903420,36.471954],[66.051042,36.426589],[64.544965,35.984305],[63.385188,35.145104],[62.571713,33.908985],[62.058793,31.402718],[62.558617,28.397463],[64.139831,25.222111],[66.792616,22.364281],[68.659683,20.992788],[70.628029,19.962924],[72.697656,19.274690],[74.868566,18.928088],[77.505000,18.959991],[79.625261,19.475282],[81.229348,20.473959],[82.317261,21.956021],[77.900313,24.473622],[77.376772,23.581268],[76.524907,22.979514],[75.344715,22.668356],[73.836199,22.647794],[71.497039,23.277204],[69.471528,24.779819],[68.184337,26.415707],[67.354529,28.261379],[67.024562,30.019172],[67.210782,31.459416],[67.623233,32.171750],[68.259474,32.653017],[70.203326,32.922352],[72.673161,32.457387],[73.701430,31.867679],[74.590861,30.949095],[75.953199,28.125286],[76.253767,26.968548],[81.088881,26.015945],[78.096337,35.689455]]);
  }
}

module poly_rect3016(h)
{
  scale([25.4/90, -25.4/90, 1]) union()
  {
    linear_extrude(height=h)
      polygon([[-168.446745,25.854817],[-92.350218,25.854817],[-92.350218,30.150589],[-168.446745,30.150589]]);
  }
}

module poly_path3106(h)
{
  scale([25.4/90, -25.4/90, 1]) union()
  {
    linear_extrude(height=h)
      polygon([[-150.192595,10.763517],[-163.603455,11.488437],[-177.165345,13.119487],[-175.413475,4.934027],[-168.919475,4.058087],[-165.596965,-10.681773],[-160.975655,-25.542463],[-167.258225,-24.968573],[-164.721025,-33.456083],[-158.196825,-34.090383],[-148.153804,-34.679337],[-138.080535,-34.694473],[-140.708335,-26.206963],[-155.961685,-25.784103],[-148.289705,-23.458343],[-150.766485,-14.970833],[-152.843071,-6.475768],[-154.783705,2.819697],[-148.440725,2.578057]]);
  }
}

module poly_path3133(h)
{
  scale([25.4/90, -25.4/90, 1]) union()
  {
    linear_extrude(height=h)
      polygon([[57.788876,35.428616],[52.862282,36.041010],[48.183978,28.839743],[47.530586,30.835685],[45.923232,36.562679],[40.735283,36.970939],[43.100573,28.533546],[44.943143,22.863266],[44.146004,21.638486],[49.451561,19.302327],[54.443497,28.340758],[55.410522,24.643735],[57.658193,19.086855],[62.231953,20.186888],[59.958143,26.616993],[57.788876,35.428616]]);
  }
}

module poly_path3129(h)
{
  scale([25.4/90, -25.4/90, 1]) union()
  {
    linear_extrude(height=h)
      polygon([[27.732728,19.143559],[26.112310,21.309605],[25.550398,22.908624],[23.498740,29.111920],[21.473210,35.349237],[16.232994,35.757496],[16.611957,34.498687],[18.768159,28.204675],[11.502413,35.213144],[7.660452,28.839743],[7.020134,30.722285],[5.412780,36.562679],[0.211756,36.970939],[2.577046,28.533546],[4.432691,22.863266],[3.622477,21.638486],[8.928045,19.302327],[13.279652,28.227358],[22.583982,18.270335],[27.732728,19.143559]]);
  }
}

poly_path3118(5);
poly_path3116(5);
poly_path3112(5);
poly_path3110(5);
poly_rect30160(5);
poly_path3125(5);
poly_path3127(5);
poly_path3114(5);
poly_path3123(5);
poly_path3131(5);
poly_path3121(5);
poly_path3108(5);
poly_path3135(5);
poly_rect3016(5);
poly_path3106(5);
poly_path3133(5);
poly_path3129(5);
